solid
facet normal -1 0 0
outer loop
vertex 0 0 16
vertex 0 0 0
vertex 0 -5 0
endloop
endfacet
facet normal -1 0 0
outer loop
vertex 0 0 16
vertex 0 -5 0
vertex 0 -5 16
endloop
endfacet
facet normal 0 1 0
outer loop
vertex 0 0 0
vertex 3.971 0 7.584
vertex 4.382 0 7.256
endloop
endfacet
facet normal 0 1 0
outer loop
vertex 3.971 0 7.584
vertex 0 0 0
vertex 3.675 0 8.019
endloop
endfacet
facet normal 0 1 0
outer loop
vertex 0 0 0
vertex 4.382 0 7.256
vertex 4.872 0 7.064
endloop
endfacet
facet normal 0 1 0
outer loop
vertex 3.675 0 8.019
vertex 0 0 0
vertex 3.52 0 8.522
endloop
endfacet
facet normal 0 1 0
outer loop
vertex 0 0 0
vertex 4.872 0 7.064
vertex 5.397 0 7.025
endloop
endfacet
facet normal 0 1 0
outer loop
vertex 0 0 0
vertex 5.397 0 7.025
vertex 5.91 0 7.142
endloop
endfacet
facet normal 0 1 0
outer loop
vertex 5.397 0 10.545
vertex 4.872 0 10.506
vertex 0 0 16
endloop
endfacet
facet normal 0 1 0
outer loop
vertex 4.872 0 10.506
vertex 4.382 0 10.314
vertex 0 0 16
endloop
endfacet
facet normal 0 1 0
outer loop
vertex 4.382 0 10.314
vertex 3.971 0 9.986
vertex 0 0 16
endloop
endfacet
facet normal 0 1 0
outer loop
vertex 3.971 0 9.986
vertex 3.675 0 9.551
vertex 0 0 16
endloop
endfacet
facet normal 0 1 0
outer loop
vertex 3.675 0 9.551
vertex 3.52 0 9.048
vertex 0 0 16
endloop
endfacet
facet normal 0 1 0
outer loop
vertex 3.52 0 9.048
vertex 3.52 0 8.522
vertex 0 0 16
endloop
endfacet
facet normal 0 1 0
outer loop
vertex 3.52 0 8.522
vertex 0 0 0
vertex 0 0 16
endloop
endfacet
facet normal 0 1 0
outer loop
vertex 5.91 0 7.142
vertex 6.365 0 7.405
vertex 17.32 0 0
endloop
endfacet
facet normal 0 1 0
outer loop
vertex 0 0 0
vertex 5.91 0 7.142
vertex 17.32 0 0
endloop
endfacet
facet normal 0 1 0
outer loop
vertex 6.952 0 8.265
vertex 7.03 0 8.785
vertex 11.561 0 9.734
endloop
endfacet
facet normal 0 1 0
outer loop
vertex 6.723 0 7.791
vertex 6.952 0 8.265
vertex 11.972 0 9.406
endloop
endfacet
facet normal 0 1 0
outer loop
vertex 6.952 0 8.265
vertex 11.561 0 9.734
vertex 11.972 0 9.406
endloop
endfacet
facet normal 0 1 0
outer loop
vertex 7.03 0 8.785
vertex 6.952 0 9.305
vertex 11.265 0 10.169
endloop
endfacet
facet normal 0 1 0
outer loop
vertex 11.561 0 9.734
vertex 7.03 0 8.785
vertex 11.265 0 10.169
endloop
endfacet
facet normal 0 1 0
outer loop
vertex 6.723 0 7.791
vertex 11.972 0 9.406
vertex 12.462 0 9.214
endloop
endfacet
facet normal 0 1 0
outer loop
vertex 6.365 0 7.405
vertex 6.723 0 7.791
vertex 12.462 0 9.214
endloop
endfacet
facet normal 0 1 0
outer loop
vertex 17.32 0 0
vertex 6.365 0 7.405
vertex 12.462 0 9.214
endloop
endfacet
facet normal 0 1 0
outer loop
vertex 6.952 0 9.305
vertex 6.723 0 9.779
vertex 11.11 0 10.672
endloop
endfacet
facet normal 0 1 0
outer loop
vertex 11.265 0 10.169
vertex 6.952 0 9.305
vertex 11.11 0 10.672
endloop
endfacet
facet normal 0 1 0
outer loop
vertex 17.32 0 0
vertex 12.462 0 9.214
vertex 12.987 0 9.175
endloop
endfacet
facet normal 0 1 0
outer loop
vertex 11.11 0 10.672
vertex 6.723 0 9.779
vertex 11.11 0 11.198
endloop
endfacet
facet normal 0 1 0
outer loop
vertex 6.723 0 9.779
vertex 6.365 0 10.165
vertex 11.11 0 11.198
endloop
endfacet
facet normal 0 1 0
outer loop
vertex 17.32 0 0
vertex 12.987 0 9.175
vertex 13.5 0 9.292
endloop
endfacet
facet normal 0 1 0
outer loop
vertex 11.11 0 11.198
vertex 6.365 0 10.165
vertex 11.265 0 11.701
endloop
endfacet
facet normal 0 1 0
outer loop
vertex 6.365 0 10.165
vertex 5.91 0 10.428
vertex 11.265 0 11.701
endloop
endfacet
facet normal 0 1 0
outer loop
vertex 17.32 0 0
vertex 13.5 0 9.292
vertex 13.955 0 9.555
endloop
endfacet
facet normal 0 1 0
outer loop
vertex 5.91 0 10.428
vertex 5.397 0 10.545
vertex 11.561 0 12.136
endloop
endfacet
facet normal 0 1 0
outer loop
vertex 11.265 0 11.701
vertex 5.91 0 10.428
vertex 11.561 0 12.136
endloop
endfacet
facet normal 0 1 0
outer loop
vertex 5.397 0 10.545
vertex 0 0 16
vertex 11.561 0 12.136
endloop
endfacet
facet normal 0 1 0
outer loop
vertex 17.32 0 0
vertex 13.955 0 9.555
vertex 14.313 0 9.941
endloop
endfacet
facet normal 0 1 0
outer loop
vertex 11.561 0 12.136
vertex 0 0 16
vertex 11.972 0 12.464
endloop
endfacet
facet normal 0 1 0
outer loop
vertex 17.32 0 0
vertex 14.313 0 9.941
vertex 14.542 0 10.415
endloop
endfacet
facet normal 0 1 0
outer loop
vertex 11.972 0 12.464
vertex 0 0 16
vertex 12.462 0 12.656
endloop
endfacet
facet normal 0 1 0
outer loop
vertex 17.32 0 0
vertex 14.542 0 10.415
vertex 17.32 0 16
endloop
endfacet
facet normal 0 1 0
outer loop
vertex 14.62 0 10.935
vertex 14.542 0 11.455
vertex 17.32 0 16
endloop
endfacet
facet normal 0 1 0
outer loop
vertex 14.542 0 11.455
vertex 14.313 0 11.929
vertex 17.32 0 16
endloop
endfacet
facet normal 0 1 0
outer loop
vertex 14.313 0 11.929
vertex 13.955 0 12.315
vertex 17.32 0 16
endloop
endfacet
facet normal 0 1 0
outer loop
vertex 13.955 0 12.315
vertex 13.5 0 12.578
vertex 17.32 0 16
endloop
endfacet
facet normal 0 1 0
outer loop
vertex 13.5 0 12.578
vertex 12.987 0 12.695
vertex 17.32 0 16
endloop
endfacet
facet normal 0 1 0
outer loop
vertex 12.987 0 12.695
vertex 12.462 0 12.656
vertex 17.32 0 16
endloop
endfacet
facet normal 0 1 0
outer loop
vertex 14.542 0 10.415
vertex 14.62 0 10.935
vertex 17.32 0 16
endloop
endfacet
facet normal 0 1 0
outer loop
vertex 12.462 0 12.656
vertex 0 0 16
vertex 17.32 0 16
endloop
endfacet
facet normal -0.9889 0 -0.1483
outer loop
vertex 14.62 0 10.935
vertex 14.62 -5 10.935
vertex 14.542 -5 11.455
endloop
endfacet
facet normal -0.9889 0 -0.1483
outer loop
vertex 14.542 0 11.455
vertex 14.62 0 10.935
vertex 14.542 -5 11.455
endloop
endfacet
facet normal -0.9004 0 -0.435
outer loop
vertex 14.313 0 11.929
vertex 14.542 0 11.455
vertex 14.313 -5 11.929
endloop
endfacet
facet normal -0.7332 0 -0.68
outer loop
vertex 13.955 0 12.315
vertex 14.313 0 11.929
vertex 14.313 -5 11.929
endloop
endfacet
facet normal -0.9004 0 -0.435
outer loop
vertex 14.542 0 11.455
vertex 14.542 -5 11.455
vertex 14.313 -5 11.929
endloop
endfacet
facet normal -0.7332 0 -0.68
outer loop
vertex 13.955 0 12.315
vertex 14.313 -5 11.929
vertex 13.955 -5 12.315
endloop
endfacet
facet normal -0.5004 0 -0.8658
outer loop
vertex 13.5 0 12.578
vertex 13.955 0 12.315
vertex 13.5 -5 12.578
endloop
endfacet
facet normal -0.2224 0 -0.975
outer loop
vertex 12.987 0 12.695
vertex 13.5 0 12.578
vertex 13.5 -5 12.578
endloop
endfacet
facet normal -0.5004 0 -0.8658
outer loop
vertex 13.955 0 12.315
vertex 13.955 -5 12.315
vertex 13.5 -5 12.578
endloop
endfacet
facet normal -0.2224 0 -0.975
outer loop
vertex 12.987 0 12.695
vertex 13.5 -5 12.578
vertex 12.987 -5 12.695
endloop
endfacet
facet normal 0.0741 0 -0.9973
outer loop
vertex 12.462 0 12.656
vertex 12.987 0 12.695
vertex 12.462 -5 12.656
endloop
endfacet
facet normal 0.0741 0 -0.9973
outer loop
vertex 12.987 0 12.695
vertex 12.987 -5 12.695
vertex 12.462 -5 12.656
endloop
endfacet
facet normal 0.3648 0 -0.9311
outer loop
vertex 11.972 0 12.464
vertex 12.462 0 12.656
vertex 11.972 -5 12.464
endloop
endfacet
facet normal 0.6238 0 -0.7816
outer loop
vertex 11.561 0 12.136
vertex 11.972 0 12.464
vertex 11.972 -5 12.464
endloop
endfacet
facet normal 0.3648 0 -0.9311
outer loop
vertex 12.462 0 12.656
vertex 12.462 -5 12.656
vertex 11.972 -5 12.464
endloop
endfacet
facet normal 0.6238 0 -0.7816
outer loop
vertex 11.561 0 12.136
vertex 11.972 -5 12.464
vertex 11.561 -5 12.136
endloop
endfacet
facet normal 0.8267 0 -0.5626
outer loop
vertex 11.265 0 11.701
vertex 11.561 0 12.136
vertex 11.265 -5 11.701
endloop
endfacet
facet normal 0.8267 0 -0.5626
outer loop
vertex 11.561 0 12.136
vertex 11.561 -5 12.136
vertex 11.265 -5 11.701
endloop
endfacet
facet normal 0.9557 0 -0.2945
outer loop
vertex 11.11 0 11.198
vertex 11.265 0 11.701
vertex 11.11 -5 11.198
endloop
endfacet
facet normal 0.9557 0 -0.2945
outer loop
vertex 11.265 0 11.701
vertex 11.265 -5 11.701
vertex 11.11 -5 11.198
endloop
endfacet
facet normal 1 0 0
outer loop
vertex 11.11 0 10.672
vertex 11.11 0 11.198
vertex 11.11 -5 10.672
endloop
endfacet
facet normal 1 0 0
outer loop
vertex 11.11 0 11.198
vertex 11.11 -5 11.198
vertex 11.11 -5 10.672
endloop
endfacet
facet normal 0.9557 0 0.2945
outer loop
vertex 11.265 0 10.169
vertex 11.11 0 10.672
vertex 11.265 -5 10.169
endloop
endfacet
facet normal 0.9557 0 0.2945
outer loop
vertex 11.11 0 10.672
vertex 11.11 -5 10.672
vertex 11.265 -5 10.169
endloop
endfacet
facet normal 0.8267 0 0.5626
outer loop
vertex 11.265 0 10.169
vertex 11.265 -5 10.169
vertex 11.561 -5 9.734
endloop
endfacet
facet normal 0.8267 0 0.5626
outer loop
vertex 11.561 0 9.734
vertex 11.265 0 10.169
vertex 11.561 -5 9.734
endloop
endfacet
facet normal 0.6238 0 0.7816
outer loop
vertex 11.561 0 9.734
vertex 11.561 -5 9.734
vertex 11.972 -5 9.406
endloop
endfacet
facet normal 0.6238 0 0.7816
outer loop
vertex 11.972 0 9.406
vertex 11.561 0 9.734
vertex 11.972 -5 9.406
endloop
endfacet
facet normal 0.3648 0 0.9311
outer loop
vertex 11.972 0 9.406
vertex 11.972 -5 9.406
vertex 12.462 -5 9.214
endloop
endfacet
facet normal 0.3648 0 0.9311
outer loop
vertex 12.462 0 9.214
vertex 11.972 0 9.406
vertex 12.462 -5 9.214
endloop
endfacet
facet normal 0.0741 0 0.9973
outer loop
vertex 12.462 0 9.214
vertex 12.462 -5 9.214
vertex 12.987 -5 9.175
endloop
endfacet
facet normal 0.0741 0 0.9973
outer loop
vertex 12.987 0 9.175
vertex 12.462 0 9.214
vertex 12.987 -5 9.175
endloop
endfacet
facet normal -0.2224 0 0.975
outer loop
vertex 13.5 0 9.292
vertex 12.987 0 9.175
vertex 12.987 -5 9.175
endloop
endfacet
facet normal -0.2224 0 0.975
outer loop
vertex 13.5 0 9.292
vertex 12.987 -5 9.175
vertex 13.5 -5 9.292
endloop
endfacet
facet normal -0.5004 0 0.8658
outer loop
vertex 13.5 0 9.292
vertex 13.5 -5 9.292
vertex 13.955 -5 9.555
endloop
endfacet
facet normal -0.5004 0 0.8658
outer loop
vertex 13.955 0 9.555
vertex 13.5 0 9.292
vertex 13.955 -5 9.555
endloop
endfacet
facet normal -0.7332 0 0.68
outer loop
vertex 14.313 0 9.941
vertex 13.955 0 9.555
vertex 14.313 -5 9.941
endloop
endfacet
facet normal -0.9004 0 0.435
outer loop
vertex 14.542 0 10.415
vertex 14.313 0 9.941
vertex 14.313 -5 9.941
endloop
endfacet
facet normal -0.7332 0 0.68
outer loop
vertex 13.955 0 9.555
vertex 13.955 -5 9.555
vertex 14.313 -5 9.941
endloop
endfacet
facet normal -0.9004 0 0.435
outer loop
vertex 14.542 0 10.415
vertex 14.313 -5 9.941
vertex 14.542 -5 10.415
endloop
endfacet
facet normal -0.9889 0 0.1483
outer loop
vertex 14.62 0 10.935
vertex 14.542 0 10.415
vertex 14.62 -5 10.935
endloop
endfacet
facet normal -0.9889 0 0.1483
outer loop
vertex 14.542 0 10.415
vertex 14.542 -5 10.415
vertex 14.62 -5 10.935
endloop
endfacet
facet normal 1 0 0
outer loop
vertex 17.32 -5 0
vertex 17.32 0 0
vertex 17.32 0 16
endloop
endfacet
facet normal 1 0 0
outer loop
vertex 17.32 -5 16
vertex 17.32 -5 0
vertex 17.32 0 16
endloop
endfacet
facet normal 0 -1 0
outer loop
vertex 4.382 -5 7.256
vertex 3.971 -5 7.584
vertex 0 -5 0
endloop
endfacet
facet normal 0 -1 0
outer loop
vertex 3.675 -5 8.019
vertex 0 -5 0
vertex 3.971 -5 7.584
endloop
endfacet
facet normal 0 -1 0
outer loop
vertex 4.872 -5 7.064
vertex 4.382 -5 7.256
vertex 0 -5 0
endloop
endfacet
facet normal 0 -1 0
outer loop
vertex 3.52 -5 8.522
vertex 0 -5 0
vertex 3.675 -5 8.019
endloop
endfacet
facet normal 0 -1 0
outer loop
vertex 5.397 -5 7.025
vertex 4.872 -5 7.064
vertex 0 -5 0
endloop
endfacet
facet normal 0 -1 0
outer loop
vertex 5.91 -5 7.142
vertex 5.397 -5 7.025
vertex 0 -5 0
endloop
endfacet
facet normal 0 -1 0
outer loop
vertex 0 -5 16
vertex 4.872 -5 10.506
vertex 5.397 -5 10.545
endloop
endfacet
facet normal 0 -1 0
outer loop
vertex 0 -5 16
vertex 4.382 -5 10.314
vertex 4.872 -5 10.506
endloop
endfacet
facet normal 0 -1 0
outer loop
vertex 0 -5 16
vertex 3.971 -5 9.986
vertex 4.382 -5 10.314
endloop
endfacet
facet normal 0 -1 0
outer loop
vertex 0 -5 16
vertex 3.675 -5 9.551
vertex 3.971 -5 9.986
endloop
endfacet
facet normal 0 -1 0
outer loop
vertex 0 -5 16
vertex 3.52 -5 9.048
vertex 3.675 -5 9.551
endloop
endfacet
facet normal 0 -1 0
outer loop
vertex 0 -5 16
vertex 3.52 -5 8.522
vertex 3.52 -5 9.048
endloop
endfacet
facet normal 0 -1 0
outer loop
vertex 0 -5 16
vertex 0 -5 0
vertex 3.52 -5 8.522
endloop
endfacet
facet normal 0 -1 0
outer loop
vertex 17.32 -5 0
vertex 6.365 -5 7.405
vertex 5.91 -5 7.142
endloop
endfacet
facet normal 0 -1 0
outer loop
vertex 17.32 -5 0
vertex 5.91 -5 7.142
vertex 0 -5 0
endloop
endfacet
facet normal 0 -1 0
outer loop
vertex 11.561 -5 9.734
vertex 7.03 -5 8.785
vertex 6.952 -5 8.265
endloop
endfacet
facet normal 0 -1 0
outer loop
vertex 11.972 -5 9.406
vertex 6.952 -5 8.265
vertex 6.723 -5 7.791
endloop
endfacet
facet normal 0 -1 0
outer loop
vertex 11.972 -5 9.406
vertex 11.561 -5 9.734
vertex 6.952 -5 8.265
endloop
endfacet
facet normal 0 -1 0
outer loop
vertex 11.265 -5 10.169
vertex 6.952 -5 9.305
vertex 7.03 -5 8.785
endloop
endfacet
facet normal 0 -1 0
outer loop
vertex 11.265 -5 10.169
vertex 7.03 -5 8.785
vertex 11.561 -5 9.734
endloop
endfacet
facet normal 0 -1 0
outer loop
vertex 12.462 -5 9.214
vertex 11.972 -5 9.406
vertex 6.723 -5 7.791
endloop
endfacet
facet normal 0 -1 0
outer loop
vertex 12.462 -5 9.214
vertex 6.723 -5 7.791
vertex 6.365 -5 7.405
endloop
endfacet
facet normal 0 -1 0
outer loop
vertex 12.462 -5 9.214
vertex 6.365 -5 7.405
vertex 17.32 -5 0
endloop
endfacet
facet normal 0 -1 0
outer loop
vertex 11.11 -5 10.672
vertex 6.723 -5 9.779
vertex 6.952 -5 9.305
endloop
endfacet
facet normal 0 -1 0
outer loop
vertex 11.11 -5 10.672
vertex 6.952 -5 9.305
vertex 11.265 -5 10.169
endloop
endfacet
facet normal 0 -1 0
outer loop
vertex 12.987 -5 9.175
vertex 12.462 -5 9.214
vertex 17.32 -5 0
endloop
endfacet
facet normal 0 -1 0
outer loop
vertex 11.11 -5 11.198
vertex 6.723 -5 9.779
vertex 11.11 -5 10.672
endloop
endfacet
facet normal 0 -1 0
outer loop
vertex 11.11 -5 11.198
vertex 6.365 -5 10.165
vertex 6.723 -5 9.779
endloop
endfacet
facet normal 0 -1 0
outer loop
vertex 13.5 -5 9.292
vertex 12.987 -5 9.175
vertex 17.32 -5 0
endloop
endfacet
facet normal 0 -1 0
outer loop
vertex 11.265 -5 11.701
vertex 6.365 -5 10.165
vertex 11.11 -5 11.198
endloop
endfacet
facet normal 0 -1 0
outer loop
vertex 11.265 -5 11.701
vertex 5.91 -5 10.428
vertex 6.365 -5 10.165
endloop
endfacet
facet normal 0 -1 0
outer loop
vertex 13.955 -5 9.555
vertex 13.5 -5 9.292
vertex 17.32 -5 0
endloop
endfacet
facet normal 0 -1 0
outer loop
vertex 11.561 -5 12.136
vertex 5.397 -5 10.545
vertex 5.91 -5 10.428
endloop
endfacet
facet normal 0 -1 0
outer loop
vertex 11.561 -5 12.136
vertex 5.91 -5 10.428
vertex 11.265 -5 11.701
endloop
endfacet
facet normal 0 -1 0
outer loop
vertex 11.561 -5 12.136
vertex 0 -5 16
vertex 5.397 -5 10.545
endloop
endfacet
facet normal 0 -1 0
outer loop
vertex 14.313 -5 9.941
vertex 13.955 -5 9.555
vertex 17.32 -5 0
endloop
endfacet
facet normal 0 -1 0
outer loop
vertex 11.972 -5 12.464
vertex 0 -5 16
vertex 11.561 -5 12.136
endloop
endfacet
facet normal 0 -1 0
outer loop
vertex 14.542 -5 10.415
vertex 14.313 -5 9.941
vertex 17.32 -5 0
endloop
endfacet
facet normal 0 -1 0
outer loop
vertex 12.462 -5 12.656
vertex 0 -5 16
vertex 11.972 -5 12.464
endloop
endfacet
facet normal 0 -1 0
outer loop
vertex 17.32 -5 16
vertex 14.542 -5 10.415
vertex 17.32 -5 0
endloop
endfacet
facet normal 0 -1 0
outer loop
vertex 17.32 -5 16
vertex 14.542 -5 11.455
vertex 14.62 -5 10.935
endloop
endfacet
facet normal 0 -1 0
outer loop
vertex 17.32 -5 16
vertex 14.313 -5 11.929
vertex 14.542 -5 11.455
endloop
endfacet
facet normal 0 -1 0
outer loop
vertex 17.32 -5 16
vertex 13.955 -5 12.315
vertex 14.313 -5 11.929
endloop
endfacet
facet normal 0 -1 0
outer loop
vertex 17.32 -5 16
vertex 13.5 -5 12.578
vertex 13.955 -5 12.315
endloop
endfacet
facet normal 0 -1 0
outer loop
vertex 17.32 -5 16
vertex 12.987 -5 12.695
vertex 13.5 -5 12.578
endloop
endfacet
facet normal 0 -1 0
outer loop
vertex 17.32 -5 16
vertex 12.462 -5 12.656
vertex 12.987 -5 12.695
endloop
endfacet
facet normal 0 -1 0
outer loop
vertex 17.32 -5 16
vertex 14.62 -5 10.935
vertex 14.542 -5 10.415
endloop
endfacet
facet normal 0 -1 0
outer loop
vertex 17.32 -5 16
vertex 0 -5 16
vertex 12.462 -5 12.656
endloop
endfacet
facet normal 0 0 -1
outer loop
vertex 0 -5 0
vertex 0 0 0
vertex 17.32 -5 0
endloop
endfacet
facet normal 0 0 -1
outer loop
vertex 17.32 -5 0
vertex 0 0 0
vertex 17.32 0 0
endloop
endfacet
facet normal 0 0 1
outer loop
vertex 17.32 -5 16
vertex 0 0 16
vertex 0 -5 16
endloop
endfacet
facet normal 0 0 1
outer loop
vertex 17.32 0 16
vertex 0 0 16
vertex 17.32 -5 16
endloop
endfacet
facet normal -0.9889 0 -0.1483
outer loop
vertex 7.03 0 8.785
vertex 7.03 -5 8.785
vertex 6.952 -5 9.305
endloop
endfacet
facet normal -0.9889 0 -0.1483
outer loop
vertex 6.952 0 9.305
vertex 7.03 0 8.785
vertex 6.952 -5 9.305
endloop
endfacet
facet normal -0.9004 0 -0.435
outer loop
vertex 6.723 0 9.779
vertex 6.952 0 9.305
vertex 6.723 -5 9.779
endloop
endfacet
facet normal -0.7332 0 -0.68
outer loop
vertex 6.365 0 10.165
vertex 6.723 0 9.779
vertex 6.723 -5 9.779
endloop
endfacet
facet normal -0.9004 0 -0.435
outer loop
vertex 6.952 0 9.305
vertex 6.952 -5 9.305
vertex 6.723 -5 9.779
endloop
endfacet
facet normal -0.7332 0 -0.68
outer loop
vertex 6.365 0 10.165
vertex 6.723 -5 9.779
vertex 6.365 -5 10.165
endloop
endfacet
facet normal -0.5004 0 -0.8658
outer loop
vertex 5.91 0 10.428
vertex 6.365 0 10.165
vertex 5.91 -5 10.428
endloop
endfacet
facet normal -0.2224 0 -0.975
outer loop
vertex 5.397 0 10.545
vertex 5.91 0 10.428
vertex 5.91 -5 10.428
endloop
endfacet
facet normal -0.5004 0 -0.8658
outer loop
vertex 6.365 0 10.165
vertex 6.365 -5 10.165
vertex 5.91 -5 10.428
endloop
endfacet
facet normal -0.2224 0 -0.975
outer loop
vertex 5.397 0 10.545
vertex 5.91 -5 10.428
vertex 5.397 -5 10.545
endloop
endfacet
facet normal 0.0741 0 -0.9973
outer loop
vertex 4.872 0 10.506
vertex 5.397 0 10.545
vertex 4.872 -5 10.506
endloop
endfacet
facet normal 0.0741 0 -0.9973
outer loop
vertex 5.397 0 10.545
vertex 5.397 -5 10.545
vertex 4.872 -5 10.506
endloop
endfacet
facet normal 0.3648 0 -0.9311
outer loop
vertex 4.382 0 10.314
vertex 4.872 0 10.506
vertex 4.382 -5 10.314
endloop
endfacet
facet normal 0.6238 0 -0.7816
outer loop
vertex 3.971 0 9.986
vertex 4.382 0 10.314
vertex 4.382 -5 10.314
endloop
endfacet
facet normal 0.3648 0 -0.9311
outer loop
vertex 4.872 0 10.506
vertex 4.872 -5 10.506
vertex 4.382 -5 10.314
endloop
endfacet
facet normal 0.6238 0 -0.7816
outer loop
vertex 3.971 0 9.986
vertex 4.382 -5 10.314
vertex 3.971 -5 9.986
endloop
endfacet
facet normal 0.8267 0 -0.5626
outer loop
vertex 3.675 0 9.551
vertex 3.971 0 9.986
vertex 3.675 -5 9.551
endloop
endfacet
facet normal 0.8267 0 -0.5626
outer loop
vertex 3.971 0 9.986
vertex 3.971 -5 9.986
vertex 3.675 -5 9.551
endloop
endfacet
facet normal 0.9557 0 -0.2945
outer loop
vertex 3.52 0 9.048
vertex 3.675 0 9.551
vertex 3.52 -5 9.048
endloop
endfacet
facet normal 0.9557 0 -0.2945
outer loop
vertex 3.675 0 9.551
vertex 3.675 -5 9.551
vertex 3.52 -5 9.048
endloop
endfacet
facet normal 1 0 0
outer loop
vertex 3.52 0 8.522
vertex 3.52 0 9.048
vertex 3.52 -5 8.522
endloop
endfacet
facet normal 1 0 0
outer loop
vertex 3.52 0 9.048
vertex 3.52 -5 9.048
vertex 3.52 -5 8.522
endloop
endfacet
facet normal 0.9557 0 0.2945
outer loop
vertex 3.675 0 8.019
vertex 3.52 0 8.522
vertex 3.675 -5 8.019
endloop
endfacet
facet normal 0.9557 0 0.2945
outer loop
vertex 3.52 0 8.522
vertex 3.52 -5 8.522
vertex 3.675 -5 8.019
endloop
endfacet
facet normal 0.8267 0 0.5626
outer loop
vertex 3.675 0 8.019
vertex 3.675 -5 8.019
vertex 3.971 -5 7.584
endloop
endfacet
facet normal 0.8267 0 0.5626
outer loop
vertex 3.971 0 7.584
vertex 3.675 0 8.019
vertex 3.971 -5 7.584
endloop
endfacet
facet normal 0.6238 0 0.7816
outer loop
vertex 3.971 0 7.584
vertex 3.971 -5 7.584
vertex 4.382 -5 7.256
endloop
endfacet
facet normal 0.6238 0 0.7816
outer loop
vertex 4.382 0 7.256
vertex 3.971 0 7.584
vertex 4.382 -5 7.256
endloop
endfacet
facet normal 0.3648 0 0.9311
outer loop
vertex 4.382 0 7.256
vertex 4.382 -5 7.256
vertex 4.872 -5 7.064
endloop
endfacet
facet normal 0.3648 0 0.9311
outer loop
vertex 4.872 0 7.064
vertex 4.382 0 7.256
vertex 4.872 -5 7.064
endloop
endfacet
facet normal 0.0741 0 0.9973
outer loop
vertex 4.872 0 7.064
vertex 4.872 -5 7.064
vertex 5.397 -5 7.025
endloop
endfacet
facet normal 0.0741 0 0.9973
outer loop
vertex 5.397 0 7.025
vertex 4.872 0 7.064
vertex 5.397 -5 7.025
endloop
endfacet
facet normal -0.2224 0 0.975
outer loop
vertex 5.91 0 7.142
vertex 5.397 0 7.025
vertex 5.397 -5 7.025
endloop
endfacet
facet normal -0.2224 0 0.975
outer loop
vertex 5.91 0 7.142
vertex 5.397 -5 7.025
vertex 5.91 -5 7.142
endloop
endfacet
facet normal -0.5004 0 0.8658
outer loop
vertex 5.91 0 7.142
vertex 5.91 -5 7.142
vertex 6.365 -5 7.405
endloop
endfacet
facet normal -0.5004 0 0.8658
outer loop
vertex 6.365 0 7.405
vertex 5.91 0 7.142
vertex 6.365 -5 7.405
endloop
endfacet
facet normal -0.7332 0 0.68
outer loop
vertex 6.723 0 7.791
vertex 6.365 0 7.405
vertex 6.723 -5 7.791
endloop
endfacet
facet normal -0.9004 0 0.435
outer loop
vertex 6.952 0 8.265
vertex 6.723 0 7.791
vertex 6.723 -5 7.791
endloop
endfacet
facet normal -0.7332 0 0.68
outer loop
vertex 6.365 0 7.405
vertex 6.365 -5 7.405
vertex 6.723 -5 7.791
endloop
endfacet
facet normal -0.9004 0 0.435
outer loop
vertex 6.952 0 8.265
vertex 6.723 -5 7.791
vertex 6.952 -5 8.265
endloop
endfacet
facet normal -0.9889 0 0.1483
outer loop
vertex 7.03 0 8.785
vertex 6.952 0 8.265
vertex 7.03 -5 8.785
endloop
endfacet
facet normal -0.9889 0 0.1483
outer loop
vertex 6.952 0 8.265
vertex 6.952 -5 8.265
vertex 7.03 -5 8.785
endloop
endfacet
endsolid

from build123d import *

# Parameters (mm, degrees)
F0_W     = 17.32
F0_H     = 16
F1_DEPTH = 5
F2_R     = 1.765
F4_DEPTH = 5
F3_R     = 1.765
F5_DEPTH = 5


with BuildPart() as f1:
    # F0 (on Front) → F1 (new body)
    with BuildSketch(Plane.XZ):
        with Locations((8.66, 8)):
            Rectangle(F0_W, F0_H)
    extrude(amount=F1_DEPTH)

    # F2 (on face) → F4 (cut, through all)
    with BuildSketch(Plane.XZ.offset(5)):
        with Locations((12.855, 10.935)):
            Circle(F2_R)
    extrude(amount=-F4_DEPTH, mode=Mode.SUBTRACT)

    # F3 (on face) → F5 (cut, through all)
    with BuildSketch(Plane.XZ.offset(5)):
        with Locations((5.265, 8.785)):
            Circle(F3_R)
    extrude(amount=-F5_DEPTH, mode=Mode.SUBTRACT)


solid = f1.part
